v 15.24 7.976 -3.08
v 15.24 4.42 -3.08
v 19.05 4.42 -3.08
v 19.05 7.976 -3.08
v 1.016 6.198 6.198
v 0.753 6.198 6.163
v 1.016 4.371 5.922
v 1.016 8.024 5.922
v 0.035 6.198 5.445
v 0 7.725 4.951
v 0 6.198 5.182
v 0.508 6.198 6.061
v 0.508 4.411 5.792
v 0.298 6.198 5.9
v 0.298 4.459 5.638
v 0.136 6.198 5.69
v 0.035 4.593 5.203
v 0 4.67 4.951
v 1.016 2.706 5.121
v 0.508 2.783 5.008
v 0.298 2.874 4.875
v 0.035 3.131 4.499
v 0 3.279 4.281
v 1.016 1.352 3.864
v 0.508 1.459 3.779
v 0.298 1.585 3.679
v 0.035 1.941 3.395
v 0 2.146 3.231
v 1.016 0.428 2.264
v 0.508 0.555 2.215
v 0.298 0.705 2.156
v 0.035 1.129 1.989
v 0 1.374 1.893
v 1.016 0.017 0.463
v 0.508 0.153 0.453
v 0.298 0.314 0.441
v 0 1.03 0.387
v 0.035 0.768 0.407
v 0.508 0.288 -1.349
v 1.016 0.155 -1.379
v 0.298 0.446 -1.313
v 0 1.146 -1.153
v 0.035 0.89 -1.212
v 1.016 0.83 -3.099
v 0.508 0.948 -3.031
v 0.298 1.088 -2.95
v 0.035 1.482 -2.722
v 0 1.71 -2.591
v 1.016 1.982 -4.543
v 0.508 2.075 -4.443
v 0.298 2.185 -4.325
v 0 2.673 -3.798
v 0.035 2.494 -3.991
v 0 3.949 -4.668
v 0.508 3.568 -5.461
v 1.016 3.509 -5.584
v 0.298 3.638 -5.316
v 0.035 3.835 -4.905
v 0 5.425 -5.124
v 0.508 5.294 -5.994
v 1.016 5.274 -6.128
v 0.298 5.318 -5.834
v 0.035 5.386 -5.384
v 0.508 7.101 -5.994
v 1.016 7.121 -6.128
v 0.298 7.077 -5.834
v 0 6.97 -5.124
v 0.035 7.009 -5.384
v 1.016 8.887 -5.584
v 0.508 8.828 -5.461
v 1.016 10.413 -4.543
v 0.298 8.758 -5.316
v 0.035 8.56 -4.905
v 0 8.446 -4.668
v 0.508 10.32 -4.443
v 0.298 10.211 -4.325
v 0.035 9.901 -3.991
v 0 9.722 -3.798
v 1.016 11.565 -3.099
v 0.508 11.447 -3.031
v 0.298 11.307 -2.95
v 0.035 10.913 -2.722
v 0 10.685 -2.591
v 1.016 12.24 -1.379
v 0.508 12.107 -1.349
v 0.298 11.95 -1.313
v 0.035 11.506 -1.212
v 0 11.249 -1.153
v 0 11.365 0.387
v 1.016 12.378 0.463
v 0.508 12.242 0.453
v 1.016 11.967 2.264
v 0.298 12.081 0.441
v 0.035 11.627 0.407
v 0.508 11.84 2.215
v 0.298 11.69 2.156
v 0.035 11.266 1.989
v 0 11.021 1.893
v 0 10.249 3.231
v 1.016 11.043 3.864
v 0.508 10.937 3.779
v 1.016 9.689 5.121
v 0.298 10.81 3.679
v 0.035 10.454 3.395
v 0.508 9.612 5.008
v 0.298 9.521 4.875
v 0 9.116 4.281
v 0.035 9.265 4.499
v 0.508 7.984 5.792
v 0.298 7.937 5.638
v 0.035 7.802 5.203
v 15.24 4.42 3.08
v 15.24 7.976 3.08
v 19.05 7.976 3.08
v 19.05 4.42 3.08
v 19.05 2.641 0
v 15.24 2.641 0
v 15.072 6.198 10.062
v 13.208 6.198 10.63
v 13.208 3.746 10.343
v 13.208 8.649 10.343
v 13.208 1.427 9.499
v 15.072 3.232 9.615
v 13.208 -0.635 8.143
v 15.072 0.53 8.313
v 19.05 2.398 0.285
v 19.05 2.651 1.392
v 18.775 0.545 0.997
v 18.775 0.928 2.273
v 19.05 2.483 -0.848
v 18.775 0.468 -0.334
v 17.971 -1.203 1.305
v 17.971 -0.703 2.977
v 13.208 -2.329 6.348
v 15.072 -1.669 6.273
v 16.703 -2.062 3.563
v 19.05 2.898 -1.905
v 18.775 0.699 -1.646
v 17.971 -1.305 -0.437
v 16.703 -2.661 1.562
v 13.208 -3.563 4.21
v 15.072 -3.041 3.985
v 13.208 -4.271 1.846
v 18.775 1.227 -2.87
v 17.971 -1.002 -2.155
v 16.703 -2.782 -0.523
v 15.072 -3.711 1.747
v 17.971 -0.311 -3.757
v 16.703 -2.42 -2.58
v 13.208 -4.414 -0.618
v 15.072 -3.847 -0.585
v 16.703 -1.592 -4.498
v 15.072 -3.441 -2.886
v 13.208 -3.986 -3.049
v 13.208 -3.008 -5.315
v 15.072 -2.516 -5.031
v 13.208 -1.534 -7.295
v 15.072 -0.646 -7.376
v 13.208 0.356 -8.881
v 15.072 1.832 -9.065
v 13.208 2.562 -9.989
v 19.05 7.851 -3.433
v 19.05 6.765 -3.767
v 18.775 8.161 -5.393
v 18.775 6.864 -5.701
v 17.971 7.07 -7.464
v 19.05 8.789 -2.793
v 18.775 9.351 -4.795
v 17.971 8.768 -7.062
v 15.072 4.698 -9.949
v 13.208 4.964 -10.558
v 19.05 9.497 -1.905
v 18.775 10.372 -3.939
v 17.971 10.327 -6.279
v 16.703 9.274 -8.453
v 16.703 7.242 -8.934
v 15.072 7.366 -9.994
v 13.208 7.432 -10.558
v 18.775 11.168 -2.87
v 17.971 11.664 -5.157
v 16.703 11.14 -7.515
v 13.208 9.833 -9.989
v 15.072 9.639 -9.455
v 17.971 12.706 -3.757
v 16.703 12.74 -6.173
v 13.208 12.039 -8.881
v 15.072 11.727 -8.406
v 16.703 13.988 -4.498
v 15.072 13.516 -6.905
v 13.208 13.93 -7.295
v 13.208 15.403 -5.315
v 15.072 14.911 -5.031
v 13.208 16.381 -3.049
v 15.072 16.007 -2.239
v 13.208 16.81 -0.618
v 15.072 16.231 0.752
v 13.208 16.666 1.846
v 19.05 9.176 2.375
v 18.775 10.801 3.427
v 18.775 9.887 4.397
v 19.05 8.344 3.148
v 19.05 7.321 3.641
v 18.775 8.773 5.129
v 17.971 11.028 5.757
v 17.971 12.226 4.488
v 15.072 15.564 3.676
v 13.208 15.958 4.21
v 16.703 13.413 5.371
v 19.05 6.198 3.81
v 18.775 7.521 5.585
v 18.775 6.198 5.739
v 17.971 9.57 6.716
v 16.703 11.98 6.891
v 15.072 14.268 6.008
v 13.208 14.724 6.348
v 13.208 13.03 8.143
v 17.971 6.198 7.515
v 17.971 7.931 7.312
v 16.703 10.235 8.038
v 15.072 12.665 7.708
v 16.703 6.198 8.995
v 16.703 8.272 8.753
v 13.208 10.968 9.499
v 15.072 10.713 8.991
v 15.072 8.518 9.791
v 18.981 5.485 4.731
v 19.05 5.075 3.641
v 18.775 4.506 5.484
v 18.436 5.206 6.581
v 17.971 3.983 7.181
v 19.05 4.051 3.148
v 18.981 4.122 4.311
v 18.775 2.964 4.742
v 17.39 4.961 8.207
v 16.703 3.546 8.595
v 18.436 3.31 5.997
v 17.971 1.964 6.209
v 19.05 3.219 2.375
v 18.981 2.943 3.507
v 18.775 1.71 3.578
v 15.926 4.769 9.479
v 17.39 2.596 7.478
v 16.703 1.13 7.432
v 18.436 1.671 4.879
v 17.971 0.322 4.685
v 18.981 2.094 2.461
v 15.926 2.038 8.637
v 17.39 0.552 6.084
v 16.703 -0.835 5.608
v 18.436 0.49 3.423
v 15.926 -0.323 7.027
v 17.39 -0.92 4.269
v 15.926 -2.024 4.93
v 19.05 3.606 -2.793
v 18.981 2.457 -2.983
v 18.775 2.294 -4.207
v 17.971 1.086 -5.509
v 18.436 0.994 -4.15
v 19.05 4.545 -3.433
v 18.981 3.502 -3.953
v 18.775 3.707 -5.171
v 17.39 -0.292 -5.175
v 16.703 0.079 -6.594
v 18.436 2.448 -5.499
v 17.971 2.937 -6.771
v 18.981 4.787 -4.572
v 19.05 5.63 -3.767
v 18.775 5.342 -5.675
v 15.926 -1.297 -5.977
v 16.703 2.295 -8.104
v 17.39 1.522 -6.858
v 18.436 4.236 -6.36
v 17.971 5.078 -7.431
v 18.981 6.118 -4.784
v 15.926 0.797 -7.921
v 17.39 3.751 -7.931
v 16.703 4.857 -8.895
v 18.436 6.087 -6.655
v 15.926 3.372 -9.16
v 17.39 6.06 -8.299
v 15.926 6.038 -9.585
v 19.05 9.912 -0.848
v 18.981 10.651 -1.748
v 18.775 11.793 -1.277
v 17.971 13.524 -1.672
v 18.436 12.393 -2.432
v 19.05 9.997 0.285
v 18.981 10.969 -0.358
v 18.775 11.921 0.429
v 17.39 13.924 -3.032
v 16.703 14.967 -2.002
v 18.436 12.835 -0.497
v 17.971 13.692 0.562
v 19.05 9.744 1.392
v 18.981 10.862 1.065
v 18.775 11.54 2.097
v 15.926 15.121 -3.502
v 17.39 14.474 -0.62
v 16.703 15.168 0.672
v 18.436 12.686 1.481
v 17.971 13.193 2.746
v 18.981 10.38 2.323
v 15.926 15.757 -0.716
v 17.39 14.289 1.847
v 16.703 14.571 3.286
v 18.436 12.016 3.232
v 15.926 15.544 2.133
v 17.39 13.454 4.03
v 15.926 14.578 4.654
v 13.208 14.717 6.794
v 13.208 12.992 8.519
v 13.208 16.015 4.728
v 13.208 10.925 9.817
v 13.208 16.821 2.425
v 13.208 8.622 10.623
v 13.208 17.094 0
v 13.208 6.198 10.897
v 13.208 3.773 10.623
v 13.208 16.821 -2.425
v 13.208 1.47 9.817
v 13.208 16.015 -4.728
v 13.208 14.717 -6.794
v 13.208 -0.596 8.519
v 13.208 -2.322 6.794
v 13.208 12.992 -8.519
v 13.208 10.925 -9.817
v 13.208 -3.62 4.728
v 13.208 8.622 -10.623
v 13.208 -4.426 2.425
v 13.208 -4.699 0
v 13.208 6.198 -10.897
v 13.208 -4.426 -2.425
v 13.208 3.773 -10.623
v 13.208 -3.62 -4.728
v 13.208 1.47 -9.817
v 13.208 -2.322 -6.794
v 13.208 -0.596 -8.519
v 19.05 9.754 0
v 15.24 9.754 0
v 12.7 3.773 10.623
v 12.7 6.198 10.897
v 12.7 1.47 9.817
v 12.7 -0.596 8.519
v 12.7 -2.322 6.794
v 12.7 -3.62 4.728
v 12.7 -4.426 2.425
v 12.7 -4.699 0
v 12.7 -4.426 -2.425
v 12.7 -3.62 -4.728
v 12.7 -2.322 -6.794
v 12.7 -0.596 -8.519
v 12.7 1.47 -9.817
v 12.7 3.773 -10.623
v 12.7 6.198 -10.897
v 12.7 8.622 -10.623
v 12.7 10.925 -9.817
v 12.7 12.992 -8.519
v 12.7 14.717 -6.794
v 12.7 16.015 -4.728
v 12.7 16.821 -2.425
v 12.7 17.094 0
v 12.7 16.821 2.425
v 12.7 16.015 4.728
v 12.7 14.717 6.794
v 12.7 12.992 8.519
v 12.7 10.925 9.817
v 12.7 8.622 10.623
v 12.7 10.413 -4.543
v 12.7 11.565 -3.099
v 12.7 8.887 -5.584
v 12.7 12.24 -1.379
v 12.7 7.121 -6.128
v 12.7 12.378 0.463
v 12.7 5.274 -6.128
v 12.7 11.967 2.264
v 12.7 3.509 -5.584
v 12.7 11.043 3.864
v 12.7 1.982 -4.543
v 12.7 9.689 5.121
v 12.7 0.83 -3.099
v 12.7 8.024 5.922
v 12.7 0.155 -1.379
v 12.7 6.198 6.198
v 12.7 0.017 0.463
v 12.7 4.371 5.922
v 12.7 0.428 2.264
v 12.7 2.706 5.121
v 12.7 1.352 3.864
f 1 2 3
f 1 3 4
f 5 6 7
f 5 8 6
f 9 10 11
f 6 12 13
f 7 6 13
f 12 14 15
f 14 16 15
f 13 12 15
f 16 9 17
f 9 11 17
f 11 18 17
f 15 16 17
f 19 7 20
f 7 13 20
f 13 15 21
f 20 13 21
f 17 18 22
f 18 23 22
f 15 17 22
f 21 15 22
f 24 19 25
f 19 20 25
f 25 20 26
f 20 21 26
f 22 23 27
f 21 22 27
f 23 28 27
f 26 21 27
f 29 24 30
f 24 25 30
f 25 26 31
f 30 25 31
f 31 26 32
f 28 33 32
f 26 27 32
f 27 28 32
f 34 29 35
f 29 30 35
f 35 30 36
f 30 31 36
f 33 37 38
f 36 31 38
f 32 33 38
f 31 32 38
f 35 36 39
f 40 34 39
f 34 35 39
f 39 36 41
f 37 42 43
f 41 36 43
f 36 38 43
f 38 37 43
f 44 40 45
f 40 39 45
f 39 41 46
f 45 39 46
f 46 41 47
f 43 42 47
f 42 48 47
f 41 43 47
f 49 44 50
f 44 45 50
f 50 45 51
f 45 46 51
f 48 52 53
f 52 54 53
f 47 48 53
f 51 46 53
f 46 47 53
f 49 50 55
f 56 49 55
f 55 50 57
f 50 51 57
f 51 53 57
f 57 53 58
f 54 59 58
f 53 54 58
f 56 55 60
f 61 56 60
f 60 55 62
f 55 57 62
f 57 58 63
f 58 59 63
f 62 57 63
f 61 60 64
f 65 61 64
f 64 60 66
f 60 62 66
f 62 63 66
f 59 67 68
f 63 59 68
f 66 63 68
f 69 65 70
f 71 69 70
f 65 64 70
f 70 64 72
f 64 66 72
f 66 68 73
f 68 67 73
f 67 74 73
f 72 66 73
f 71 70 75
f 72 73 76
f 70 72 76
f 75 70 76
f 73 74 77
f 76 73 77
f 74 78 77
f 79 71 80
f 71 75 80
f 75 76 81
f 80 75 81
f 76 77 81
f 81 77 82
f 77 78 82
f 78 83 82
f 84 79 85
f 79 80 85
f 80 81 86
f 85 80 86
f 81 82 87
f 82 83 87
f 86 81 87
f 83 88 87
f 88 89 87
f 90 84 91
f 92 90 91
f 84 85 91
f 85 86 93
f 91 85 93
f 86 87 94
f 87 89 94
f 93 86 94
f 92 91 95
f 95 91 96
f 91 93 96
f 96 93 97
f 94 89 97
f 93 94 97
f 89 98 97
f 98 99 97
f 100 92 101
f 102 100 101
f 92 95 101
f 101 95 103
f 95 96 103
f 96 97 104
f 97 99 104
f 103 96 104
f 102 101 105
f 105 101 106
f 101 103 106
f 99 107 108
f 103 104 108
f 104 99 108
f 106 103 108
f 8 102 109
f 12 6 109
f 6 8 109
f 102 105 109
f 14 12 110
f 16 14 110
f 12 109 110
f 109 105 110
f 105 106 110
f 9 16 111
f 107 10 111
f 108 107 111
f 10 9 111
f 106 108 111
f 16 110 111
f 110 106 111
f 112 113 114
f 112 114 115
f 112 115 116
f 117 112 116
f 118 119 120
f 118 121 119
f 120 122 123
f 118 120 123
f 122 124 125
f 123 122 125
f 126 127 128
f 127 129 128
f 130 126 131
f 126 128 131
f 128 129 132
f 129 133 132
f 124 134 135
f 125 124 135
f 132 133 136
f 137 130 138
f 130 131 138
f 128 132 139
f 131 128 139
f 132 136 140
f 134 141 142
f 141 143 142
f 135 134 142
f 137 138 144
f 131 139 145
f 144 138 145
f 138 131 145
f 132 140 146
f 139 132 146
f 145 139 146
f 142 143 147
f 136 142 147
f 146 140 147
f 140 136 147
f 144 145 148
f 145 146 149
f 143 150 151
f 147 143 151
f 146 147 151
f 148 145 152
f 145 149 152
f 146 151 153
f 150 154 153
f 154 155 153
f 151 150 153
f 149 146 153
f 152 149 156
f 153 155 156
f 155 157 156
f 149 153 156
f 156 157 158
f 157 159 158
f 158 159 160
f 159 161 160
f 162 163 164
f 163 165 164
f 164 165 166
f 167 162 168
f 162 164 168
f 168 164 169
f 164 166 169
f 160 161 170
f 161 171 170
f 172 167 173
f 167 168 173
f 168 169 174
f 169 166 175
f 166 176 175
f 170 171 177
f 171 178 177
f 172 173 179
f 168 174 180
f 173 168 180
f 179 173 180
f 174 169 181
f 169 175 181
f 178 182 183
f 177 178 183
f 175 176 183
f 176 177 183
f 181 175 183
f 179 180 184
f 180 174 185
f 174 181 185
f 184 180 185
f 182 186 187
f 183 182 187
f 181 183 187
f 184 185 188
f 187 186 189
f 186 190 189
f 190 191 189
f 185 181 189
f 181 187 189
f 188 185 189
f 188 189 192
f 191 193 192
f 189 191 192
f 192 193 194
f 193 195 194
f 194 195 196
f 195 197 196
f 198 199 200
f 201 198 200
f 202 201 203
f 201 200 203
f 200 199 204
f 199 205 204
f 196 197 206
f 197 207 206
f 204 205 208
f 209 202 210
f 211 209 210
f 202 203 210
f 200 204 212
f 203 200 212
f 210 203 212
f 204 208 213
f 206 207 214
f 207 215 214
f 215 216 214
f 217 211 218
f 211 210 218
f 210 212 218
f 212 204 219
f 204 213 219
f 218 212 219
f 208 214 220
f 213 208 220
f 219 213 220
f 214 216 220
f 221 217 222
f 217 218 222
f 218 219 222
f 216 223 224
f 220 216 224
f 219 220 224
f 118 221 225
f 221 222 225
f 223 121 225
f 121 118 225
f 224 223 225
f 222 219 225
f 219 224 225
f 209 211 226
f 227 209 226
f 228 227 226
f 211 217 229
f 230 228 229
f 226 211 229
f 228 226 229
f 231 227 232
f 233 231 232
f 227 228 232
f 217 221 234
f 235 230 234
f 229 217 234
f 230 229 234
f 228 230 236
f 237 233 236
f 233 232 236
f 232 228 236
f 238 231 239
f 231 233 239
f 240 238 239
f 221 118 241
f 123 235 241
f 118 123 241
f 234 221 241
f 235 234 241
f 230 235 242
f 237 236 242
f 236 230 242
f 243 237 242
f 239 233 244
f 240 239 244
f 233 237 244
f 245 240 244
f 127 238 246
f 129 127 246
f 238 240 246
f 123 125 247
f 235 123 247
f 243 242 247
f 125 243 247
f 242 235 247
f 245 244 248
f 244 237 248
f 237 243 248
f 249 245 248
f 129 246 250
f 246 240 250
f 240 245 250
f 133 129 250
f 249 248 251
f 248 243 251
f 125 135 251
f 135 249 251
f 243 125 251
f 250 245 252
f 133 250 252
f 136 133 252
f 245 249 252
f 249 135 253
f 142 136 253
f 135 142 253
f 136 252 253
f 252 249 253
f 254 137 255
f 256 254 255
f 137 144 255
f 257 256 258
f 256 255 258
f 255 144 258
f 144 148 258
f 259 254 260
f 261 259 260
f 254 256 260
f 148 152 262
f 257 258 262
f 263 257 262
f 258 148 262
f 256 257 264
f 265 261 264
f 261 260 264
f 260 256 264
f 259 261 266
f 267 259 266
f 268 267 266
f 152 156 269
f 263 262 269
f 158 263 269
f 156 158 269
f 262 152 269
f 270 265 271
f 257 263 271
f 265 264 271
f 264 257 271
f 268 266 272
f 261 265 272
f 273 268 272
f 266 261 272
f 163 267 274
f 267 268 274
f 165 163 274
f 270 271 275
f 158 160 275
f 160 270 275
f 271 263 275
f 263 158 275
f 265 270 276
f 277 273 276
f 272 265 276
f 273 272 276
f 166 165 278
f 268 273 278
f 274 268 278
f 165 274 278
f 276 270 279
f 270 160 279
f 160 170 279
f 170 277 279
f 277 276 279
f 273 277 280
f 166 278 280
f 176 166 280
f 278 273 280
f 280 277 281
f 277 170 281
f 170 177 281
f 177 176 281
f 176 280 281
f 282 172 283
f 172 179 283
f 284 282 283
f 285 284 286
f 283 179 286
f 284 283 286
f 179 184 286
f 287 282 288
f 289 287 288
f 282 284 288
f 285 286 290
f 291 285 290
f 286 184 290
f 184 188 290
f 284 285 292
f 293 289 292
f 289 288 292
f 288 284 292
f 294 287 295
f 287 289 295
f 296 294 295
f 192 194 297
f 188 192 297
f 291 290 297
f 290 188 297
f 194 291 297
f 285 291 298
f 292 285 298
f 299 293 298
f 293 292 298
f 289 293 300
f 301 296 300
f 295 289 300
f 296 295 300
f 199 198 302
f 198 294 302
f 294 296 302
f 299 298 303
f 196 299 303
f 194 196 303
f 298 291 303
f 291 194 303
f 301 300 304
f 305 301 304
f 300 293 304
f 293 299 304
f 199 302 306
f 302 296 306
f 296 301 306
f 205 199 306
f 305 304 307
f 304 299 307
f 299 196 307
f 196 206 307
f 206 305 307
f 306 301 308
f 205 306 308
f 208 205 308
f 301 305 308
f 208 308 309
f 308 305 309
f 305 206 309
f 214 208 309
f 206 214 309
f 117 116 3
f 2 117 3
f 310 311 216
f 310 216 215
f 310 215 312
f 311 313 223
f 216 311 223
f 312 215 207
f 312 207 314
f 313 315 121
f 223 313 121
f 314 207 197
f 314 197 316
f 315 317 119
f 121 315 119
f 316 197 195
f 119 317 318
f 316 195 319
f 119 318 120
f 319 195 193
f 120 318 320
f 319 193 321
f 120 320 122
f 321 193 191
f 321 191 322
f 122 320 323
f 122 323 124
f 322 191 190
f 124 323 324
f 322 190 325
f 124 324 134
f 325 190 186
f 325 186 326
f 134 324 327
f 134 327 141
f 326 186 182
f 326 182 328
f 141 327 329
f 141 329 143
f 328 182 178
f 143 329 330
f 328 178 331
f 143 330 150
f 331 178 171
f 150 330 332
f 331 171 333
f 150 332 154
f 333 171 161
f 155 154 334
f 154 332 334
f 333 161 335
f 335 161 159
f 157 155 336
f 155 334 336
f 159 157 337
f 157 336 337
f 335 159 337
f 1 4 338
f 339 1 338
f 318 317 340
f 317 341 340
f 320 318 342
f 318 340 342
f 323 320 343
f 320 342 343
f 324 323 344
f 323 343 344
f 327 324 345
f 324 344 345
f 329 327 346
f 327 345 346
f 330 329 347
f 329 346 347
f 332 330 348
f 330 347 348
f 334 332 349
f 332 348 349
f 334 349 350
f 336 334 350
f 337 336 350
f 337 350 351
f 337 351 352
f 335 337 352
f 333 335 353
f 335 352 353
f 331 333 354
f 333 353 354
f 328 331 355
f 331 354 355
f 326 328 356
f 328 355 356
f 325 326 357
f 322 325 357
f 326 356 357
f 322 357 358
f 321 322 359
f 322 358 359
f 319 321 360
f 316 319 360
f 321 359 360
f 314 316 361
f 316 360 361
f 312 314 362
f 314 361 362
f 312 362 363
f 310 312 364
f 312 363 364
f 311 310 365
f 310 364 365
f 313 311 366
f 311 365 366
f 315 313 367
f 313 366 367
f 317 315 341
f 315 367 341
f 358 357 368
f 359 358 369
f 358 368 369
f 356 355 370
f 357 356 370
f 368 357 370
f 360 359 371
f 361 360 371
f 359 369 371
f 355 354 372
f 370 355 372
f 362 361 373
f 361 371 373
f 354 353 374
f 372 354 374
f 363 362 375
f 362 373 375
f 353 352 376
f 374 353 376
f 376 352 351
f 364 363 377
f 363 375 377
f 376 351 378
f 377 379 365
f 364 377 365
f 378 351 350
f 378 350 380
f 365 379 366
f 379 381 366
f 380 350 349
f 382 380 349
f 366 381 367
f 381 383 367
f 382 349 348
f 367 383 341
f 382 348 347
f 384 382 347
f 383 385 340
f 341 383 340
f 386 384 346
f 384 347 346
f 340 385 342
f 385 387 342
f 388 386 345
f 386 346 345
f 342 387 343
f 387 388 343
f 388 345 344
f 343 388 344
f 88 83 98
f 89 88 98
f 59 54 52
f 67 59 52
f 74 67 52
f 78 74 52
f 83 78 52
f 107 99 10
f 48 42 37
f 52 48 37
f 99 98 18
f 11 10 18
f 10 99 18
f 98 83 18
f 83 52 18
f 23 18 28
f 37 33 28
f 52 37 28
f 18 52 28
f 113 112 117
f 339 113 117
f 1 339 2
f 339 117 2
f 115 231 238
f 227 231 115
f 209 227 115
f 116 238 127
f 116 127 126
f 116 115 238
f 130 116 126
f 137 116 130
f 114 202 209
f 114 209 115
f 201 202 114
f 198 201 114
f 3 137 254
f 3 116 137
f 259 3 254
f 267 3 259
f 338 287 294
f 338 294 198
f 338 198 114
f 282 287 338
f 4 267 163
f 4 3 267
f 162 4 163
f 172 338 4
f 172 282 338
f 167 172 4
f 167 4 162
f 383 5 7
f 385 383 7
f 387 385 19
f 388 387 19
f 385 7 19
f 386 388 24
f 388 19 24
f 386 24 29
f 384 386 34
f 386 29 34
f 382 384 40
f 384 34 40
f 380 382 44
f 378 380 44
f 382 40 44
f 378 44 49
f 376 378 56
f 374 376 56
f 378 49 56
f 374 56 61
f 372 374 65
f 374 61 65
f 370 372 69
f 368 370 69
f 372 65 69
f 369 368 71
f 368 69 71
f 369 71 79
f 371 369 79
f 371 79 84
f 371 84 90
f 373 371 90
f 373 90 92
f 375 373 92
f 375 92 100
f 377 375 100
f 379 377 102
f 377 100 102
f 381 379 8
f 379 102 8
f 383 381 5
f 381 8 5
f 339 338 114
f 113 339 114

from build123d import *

# Parameters (mm, degrees)
BOSS_EXTRUDE1_START = 3.81
SKETCH2_R           = 3.81
BOSS_EXTRUDE1_DEPTH = 3.81
FILLET1_R           = 1.016


with BuildPart() as part:
    # Sketch1 → Revolve1 (revolve)
    with BuildSketch(Plane.XY, mode=Mode.PRIVATE) as revolve1_sk:
        with BuildLine():
            Line((0, 0), (0, 6.1976))
            Line((0, 6.1976), (15.24, 6.1976))
            Line((15.24, 6.1976), (15.24, 2.3876))
            Line((15.24, 2.3876), (19.05, 2.3876))
            ThreePointArc((19.05, 2.3876), (17.389827979, -2.102388864), (13.208, -4.4323))
            Line((13.208, -4.4323), (13.208, -4.699))
            Line((13.208, -4.699), (12.7, -4.699))
            Line((12.7, -4.699), (12.7, 0))
            Line((12.7, 0), (0, 0))
        make_face()
    revolve(revolve1_sk.sketch.rotate(Axis((0, 6.1976, 0), (1, 0, 0)), 270), axis=Axis((0, 6.1976, 0), (1, 0, 0)))

    # Sketch2 → Boss-Extrude1 (add)
    with BuildSketch(Plane(origin=(15.24, 0, 0), x_dir=(0, 0, -1), z_dir=(1, 0, 0)).offset(BOSS_EXTRUDE1_START)):
        with Locations((0, 6.1976)):
            Circle(SKETCH2_R)
        Polygon((0, 2.641411017), (3.07975, 4.419505508), (3.07975, 7.975694492), (0, 9.753788983), (-3.07975, 7.975694492), (-3.07975, 4.419505508), align=None, mode=Mode.SUBTRACT)
    extrude(amount=-BOSS_EXTRUDE1_DEPTH)

    # Fillet1
    fillet1_edges = [part.edges().sort_by_distance(p)[0] for p in [
        (0, 6.1976, -6.1976),
    ]]
    fillet(fillet1_edges, radius=FILLET1_R)


solid = part.part
